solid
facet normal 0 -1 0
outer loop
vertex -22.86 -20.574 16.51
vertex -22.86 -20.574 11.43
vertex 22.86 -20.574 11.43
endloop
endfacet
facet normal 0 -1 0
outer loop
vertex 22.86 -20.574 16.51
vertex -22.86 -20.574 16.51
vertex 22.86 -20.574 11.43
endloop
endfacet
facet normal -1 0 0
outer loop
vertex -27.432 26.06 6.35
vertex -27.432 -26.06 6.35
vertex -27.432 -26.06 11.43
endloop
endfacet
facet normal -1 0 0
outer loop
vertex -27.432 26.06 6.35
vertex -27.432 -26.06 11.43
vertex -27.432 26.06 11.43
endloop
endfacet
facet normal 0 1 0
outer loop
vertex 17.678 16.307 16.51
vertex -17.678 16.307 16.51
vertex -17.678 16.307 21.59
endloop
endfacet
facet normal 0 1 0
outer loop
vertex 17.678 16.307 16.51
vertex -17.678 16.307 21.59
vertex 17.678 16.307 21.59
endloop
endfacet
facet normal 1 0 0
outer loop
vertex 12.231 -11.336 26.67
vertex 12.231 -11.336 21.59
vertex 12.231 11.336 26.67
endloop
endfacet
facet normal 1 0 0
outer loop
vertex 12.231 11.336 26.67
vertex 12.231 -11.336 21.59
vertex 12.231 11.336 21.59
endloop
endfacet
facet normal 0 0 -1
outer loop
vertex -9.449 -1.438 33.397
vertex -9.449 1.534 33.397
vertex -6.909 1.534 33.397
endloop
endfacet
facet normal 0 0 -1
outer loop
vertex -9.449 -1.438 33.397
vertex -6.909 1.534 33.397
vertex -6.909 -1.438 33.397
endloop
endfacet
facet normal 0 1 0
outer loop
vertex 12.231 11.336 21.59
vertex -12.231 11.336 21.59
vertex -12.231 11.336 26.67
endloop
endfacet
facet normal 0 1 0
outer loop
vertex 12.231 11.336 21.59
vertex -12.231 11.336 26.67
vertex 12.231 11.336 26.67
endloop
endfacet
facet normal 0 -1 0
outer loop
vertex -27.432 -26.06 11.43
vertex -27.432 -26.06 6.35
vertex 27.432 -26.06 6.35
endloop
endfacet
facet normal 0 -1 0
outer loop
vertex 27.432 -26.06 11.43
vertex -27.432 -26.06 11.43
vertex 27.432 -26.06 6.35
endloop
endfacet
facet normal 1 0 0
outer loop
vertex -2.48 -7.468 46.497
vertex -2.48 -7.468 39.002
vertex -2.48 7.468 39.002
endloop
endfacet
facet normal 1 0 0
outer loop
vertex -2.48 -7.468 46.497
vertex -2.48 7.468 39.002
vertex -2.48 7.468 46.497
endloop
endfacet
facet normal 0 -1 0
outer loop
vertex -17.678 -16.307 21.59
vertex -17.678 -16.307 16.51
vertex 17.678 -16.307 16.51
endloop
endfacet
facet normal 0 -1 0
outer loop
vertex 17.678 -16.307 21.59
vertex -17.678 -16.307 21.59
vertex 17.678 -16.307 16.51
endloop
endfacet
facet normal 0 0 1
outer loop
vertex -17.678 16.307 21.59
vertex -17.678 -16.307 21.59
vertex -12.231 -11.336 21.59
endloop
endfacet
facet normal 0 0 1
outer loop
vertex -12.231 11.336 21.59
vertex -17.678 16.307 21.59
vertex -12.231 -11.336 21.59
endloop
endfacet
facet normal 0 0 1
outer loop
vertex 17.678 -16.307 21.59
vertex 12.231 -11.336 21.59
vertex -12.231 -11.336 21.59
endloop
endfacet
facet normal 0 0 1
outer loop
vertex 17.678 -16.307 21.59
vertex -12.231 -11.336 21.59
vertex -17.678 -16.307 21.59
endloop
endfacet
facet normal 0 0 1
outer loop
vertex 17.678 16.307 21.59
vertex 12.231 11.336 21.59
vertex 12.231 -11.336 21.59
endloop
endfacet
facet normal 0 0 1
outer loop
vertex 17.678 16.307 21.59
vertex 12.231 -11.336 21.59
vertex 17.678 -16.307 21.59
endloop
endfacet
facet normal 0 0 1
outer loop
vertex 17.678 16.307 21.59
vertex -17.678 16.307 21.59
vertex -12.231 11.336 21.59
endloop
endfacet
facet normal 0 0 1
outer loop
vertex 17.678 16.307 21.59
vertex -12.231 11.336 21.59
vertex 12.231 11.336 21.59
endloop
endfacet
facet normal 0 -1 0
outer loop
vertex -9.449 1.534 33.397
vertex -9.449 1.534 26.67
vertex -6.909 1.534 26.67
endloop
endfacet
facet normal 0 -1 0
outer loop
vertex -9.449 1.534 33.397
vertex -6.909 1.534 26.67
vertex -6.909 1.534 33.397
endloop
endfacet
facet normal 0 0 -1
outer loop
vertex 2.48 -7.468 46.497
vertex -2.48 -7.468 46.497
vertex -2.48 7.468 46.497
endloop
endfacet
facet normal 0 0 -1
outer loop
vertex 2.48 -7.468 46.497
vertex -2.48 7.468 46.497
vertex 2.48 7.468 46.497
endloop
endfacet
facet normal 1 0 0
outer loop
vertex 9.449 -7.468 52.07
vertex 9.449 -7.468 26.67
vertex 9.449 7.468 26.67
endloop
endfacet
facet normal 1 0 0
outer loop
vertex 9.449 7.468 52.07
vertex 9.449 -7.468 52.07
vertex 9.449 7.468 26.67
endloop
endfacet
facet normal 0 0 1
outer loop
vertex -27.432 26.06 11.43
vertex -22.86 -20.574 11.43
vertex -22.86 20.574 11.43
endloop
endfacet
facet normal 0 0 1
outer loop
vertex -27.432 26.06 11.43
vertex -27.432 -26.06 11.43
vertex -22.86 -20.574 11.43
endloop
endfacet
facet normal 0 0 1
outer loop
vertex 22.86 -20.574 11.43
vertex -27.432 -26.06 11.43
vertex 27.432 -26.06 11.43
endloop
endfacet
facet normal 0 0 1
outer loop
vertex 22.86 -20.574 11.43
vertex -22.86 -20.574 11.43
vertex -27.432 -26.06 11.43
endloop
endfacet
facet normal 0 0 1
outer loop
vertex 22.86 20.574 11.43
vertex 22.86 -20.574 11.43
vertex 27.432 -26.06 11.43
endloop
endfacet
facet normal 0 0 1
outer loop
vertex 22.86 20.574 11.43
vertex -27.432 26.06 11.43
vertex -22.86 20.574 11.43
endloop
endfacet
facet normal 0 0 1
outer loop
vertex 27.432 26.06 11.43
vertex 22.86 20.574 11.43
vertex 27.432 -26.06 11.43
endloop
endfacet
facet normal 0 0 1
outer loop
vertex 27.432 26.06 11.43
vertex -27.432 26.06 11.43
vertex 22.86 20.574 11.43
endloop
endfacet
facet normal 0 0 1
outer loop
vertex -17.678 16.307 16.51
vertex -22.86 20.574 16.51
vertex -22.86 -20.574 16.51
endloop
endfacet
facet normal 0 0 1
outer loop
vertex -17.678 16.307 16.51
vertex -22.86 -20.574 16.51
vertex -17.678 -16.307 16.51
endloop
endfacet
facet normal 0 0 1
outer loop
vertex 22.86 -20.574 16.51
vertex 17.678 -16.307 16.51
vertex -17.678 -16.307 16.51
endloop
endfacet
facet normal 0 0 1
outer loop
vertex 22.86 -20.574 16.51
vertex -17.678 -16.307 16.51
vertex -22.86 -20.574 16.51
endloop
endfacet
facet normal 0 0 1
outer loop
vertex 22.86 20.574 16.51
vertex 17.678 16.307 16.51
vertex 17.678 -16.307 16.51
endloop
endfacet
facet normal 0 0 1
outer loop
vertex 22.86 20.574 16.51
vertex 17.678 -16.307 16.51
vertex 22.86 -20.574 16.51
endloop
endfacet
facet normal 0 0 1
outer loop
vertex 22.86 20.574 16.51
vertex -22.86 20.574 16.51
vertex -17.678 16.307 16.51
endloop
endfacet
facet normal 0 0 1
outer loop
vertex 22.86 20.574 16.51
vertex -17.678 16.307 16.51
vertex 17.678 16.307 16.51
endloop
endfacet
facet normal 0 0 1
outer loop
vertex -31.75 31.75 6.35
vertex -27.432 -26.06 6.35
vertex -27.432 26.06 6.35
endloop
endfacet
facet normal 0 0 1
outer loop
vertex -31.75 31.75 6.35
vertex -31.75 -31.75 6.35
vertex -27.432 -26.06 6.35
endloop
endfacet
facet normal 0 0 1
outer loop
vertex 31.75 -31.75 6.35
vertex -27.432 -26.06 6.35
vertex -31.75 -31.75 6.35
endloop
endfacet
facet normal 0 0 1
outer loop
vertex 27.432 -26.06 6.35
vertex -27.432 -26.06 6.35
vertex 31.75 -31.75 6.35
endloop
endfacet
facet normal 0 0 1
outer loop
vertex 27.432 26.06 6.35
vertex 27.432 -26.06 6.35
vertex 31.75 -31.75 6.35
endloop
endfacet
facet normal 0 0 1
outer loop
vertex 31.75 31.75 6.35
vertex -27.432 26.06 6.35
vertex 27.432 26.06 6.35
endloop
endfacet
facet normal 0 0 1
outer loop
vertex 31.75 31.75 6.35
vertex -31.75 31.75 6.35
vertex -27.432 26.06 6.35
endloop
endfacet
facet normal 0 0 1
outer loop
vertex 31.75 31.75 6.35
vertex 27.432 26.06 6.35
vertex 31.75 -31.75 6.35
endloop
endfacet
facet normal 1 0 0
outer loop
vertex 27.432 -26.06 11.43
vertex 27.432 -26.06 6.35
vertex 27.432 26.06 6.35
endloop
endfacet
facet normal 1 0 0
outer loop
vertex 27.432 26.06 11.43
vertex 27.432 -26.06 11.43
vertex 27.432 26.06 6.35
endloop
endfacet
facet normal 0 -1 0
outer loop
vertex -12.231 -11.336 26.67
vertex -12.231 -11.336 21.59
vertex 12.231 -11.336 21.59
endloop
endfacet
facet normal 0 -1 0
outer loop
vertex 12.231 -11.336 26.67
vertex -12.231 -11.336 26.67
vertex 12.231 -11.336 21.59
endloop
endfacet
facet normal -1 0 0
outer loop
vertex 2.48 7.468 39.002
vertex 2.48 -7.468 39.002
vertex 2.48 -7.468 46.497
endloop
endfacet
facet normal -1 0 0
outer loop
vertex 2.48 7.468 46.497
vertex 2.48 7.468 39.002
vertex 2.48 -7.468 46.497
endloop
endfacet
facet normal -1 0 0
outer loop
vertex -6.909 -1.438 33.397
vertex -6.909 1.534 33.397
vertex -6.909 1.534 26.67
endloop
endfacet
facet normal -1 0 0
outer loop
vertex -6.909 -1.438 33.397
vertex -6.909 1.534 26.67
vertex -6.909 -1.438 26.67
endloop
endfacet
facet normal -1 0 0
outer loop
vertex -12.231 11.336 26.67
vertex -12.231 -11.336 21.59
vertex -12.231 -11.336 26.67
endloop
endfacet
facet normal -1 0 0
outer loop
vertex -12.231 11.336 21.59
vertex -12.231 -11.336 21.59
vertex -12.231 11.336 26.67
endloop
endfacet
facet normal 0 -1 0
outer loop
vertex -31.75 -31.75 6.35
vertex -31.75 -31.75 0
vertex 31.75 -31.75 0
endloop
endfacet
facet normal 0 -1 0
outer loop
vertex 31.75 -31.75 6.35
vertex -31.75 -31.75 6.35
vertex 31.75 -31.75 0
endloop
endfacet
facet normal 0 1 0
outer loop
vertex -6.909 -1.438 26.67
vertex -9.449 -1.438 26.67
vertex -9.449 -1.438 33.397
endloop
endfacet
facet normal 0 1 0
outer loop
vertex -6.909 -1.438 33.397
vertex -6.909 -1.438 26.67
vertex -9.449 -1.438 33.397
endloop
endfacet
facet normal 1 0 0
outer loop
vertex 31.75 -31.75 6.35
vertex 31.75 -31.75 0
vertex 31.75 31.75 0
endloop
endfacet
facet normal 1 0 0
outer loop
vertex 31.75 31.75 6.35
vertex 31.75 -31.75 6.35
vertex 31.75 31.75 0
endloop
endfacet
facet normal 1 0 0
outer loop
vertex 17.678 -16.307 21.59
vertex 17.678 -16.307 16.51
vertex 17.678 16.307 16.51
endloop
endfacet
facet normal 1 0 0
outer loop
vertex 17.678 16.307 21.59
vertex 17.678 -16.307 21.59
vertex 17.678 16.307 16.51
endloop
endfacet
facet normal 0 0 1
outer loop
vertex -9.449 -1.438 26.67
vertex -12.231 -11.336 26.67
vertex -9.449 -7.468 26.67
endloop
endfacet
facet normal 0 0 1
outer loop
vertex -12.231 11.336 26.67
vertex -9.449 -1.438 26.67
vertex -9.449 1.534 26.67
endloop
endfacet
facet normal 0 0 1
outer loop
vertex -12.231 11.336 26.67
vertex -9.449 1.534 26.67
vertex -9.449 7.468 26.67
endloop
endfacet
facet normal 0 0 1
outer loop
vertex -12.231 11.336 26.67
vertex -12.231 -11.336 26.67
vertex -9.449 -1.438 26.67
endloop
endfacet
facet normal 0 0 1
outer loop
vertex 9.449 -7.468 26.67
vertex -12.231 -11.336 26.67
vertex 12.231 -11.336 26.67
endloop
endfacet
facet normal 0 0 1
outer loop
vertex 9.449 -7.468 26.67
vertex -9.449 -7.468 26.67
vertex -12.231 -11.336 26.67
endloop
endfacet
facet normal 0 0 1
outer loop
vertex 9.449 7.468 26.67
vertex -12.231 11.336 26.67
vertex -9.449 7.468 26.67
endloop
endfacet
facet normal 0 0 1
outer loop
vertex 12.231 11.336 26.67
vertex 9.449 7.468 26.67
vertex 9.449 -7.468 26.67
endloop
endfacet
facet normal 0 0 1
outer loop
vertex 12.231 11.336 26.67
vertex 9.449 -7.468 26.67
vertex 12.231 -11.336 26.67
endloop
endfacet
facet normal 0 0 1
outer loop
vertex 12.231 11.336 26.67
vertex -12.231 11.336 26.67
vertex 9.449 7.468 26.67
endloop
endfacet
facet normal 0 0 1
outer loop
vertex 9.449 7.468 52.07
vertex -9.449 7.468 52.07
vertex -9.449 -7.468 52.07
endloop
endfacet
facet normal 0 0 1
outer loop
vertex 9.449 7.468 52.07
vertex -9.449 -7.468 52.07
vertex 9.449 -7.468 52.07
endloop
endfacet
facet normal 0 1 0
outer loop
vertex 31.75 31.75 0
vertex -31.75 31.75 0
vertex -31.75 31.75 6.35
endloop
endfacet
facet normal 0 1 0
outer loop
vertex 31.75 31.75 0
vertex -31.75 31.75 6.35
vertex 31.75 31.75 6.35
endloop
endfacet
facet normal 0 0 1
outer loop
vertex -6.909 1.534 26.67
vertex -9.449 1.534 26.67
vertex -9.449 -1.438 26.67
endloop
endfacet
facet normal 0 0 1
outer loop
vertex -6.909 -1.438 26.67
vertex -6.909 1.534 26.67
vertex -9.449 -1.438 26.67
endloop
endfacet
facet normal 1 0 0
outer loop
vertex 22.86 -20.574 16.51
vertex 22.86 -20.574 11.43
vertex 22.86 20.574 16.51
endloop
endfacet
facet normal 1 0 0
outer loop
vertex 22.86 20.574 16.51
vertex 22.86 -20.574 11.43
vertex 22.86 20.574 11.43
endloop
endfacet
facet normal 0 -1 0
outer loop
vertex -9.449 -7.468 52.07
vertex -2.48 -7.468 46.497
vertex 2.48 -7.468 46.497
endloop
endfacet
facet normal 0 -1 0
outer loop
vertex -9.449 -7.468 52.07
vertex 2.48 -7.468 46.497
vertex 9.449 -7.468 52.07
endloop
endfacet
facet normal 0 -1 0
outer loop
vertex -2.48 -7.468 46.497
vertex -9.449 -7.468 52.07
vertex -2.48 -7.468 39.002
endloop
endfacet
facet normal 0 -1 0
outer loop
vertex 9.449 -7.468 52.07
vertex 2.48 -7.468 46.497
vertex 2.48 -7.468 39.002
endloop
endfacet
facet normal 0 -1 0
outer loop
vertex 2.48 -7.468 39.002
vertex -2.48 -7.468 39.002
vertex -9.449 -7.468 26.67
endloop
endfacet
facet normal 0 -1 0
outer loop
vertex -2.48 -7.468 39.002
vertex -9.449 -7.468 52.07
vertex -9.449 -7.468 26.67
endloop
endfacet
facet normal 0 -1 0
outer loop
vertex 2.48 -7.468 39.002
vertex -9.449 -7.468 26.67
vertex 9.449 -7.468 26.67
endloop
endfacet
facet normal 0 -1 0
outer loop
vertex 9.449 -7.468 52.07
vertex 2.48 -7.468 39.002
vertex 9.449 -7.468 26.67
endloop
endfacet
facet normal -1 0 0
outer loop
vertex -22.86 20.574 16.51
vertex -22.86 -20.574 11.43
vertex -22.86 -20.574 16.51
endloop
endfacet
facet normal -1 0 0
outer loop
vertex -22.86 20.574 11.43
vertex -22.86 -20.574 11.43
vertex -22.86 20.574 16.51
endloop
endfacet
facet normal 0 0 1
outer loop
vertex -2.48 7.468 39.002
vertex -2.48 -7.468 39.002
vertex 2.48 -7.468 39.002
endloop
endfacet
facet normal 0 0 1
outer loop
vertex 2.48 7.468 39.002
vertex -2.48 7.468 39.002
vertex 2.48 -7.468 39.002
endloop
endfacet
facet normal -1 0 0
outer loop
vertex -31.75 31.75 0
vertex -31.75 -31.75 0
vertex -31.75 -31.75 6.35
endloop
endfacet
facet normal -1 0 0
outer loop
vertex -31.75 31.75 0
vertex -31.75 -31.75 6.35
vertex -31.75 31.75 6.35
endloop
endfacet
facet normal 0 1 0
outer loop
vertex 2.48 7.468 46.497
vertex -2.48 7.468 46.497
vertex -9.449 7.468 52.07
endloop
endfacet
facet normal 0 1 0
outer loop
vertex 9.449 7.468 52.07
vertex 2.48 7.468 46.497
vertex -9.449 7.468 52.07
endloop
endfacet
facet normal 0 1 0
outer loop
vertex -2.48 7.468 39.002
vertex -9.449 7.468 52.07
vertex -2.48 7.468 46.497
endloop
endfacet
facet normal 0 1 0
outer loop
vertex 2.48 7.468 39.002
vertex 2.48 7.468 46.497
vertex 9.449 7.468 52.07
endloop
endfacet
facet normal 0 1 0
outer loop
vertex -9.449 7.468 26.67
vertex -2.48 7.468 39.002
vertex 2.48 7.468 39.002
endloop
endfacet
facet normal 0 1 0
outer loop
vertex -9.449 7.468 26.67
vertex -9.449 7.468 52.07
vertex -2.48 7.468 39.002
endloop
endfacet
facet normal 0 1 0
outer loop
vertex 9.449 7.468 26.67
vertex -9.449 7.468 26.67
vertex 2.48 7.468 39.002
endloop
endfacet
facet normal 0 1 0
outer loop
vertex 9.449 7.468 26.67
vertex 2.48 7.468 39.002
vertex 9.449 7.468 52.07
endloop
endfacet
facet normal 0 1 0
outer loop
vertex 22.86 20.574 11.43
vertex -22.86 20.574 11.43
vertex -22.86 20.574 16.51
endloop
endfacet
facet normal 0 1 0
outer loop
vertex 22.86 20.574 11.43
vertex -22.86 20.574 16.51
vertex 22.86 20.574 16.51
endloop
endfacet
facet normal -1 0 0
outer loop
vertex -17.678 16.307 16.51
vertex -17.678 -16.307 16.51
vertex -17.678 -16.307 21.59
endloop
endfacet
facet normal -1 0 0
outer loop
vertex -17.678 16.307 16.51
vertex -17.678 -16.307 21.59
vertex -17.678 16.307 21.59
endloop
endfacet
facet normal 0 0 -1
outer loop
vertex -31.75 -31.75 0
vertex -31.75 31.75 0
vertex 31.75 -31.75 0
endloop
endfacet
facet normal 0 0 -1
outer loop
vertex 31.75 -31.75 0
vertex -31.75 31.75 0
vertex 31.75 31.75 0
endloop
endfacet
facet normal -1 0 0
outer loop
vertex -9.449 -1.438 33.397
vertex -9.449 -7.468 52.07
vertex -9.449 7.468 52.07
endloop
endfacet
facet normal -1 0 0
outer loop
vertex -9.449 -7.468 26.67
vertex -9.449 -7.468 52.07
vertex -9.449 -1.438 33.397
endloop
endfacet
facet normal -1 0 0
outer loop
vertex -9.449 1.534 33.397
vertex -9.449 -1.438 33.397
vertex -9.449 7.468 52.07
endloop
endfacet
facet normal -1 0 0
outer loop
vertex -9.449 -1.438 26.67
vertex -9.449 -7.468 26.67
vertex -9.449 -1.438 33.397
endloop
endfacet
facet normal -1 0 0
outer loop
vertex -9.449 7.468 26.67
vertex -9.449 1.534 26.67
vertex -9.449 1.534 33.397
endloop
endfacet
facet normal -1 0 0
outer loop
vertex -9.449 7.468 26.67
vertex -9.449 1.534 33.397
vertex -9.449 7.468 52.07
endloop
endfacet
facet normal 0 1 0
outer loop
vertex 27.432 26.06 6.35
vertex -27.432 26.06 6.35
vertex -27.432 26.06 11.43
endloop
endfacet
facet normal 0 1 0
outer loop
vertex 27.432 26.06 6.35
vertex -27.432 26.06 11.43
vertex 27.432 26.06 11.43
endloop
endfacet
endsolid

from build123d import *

# Parameters (mm, degrees)
F0_W      = 63.5
F0_H      = 63.5
F1_DEPTH  = 6.35
F2_W      = 54.863996
F2_H      = 52.120802
F3_DEPTH  = 5.08
F4_W      = 45.72
F4_H      = 41.148004
F5_DEPTH  = 5.08
F6_W      = 35.356802
F6_H      = 32.613602
F7_DEPTH  = 5.08
F8_W      = 24.461082
F8_H      = 22.671008
F9_DEPTH  = 5.08
F10_W     = 18.8976
F10_H     = 14.9352
F11_DEPTH = 25.4
F12_W     = 4.960672
F12_H     = 7.49556
F13_DEPTH = 39.37
F14_W     = 2.972535
F14_H     = 6.727309
F15_DEPTH = 2.54


with BuildPart() as f1:
    # F0 (on Top) → F1 (new body)
    with BuildSketch(Plane.XY):
        Rectangle(F0_W, F0_H)
    extrude(amount=F1_DEPTH)

    # F2 (on face) → F3 (join)
    with BuildSketch(Plane.XY.offset(6.35)):
        Rectangle(F2_W, F2_H)
    extrude(amount=F3_DEPTH)

    # F4 (on face) → F5 (join)
    with BuildSketch(Plane.XY.offset(11.43)):
        Rectangle(F4_W, F4_H)
    extrude(amount=F5_DEPTH)

    # F6 (on face) → F7 (join)
    with BuildSketch(Plane.XY.offset(16.51)):
        Rectangle(F6_W, F6_H)
    extrude(amount=F7_DEPTH)

    # F8 (on face) → F9 (join)
    with BuildSketch(Plane.XY.offset(21.59)):
        Rectangle(F8_W, F8_H)
    extrude(amount=F9_DEPTH)

    # F10 (on face) → F11 (join)
    with BuildSketch(Plane.XY.offset(26.67)):
        Rectangle(F10_W, F10_H)
    extrude(amount=F11_DEPTH)

    # F12 (on face) → F13 (cut)
    with BuildSketch(Plane.XZ.offset(7.4676)):
        with Locations((0, 42.749591)):
            Rectangle(F12_W, F12_H)
    extrude(amount=-F13_DEPTH, mode=Mode.SUBTRACT)

    # F14 (on face) → F15 (cut)
    with BuildSketch(Plane(origin=(-9.4488, 0, 0), x_dir=(0, -1, 0), z_dir=(-1, 0, 0))):
        with Locations((-0.047928, 30.033654)):
            Rectangle(F14_W, F14_H)
    extrude(amount=-F15_DEPTH, mode=Mode.SUBTRACT)


solid = f1.part
